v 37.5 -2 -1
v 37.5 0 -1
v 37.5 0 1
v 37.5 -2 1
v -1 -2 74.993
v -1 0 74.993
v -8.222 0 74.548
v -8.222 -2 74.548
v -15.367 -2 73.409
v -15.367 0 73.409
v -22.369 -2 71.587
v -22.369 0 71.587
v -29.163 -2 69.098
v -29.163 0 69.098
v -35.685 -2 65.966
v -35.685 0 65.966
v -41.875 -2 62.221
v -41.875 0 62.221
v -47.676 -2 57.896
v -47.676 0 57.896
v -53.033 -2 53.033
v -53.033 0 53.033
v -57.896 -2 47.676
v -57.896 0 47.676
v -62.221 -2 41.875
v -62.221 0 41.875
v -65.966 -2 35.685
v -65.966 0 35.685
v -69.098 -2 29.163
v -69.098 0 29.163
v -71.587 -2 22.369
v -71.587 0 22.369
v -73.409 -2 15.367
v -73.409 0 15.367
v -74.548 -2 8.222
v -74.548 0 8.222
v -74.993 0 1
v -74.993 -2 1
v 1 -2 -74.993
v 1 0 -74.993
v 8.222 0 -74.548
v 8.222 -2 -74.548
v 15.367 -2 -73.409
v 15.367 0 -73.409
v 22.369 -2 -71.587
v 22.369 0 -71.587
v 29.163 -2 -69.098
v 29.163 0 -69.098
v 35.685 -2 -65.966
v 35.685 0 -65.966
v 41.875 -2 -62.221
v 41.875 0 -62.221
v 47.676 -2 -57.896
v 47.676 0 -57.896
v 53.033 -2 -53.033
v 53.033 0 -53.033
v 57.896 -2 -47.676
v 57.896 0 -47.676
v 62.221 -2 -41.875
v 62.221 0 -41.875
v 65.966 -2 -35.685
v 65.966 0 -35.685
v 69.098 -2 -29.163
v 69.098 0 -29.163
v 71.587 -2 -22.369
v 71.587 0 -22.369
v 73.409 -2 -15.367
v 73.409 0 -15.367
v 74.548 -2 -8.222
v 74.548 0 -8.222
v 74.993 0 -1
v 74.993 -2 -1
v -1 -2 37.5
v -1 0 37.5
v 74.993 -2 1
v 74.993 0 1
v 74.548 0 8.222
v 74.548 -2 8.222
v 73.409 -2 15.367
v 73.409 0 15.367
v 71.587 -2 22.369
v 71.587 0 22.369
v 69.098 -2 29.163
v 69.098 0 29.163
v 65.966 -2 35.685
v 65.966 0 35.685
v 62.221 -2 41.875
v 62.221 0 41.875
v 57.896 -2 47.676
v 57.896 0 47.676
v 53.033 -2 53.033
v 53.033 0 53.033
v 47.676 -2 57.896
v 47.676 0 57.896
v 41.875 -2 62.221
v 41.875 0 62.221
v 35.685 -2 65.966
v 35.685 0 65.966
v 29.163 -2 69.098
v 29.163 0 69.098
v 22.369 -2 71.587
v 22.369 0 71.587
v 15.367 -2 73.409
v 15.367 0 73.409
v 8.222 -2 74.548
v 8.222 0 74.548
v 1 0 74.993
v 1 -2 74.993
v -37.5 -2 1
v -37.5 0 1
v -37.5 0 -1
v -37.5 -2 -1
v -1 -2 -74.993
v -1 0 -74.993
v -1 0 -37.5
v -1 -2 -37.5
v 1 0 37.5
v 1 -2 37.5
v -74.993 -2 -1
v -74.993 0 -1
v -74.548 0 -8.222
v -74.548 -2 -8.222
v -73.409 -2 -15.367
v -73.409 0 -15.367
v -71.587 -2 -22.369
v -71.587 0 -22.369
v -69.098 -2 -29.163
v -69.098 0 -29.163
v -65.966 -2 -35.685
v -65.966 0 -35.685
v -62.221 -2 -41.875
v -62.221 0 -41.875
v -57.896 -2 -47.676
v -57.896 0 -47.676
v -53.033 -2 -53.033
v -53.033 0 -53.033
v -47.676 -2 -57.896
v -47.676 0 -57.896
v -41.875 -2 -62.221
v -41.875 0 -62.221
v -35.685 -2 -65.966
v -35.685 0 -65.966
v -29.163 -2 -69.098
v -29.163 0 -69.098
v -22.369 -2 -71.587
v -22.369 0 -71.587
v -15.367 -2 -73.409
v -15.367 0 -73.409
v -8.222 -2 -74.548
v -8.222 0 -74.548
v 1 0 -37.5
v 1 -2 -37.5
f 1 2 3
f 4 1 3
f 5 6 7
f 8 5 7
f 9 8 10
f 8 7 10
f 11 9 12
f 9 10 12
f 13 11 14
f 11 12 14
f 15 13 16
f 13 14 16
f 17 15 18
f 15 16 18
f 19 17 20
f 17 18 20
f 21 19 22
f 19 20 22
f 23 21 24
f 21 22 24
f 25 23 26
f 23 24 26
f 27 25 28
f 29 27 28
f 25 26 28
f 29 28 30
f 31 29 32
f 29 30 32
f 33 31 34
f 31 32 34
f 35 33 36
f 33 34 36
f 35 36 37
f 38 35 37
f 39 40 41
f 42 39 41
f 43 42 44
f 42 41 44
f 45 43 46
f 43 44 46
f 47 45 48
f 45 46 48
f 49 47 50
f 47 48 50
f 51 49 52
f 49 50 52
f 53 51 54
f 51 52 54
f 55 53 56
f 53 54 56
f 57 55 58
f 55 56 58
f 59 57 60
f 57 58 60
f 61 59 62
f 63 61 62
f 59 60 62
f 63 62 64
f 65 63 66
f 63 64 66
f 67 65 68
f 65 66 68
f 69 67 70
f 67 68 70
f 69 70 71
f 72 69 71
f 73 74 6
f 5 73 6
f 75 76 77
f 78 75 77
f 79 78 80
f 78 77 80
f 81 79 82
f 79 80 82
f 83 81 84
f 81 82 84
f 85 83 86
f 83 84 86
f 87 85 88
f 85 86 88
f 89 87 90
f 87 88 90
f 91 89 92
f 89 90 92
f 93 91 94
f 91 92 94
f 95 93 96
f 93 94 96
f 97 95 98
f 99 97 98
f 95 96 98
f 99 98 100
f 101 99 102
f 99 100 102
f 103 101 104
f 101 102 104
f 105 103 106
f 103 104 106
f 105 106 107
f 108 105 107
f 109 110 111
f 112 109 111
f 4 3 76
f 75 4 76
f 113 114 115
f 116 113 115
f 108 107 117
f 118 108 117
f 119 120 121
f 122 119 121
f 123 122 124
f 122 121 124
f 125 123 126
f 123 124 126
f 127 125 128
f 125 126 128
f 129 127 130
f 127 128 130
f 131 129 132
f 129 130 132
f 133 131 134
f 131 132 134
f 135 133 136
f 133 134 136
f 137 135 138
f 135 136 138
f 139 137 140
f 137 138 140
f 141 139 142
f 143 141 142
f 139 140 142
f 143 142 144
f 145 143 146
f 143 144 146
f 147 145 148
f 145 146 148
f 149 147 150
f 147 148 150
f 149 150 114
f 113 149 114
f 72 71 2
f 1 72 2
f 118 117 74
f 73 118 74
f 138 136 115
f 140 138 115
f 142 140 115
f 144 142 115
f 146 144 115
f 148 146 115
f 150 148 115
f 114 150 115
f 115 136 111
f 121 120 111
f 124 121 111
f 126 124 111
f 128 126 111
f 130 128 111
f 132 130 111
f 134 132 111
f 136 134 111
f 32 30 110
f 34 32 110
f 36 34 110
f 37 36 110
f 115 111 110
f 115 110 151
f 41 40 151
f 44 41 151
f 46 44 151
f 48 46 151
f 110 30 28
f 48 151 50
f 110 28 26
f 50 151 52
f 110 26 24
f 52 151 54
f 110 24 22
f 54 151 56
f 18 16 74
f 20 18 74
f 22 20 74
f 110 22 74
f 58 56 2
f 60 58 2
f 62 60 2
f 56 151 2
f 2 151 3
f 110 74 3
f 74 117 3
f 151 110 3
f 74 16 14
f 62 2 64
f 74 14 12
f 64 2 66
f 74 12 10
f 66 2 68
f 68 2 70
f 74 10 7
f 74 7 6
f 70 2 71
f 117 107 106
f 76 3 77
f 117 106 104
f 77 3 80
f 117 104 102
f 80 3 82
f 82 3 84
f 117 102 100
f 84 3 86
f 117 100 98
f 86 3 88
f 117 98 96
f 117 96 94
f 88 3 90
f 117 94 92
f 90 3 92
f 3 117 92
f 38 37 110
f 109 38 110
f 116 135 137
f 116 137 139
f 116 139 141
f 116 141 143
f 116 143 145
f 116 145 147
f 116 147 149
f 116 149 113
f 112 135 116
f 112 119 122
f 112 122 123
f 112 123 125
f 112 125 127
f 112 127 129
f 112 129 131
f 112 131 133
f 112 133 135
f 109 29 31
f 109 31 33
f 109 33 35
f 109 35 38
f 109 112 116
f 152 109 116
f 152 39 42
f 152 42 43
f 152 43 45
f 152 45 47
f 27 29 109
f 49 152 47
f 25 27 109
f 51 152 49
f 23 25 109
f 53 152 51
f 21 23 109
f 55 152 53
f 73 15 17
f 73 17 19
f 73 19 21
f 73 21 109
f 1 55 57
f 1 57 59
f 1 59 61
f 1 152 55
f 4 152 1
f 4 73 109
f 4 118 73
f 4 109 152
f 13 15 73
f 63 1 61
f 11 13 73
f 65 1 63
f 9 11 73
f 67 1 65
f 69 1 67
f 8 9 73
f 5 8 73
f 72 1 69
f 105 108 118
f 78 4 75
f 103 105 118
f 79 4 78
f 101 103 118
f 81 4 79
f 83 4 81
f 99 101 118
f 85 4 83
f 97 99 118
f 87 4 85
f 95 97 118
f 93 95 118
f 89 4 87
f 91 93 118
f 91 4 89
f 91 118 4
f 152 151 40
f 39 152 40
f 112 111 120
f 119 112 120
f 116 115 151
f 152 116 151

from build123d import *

# Parameters (mm, degrees)
F1_DEPTH = 2


with BuildPart() as f1:
    # F0 (on Front) → F1 (new body)
    with BuildSketch(Plane.XZ):
        with BuildLine():
            Line((-1, 37.5), (-1, 74.993333))
            ThreePointArc((-1, 74.993333), (-53.033009, 53.033009), (-74.993333, 1))
            Line((-74.993333, 1), (-37.5, 1))
            Line((-37.5, 1), (-37.5, 0))
            Line((-37.5, 0), (-37.5, -1))
            Line((-37.5, -1), (-74.993333, -1))
            ThreePointArc((-74.993333, -1), (-53.033009, -53.033009), (-1, -74.993333))
            Line((-1, -74.993333), (-1, -37.5))
            Line((-1, -37.5), (1, -37.5))
            Line((1, -37.5), (1, -74.993333))
            ThreePointArc((1, -74.993333), (53.033009, -53.033009), (74.993333, -1))
            Line((74.993333, -1), (37.5, -1))
            Line((37.5, -1), (37.5, 0))
            Line((37.5, 0), (37.5, 1))
            Line((37.5, 1), (74.993333, 1))
            ThreePointArc((74.993333, 1), (53.033009, 53.033009), (1, 74.993333))
            Line((1, 74.993333), (1, 37.5))
            Line((1, 37.5), (-1, 37.5))
        make_face()
    extrude(amount=F1_DEPTH)


solid = f1.part
